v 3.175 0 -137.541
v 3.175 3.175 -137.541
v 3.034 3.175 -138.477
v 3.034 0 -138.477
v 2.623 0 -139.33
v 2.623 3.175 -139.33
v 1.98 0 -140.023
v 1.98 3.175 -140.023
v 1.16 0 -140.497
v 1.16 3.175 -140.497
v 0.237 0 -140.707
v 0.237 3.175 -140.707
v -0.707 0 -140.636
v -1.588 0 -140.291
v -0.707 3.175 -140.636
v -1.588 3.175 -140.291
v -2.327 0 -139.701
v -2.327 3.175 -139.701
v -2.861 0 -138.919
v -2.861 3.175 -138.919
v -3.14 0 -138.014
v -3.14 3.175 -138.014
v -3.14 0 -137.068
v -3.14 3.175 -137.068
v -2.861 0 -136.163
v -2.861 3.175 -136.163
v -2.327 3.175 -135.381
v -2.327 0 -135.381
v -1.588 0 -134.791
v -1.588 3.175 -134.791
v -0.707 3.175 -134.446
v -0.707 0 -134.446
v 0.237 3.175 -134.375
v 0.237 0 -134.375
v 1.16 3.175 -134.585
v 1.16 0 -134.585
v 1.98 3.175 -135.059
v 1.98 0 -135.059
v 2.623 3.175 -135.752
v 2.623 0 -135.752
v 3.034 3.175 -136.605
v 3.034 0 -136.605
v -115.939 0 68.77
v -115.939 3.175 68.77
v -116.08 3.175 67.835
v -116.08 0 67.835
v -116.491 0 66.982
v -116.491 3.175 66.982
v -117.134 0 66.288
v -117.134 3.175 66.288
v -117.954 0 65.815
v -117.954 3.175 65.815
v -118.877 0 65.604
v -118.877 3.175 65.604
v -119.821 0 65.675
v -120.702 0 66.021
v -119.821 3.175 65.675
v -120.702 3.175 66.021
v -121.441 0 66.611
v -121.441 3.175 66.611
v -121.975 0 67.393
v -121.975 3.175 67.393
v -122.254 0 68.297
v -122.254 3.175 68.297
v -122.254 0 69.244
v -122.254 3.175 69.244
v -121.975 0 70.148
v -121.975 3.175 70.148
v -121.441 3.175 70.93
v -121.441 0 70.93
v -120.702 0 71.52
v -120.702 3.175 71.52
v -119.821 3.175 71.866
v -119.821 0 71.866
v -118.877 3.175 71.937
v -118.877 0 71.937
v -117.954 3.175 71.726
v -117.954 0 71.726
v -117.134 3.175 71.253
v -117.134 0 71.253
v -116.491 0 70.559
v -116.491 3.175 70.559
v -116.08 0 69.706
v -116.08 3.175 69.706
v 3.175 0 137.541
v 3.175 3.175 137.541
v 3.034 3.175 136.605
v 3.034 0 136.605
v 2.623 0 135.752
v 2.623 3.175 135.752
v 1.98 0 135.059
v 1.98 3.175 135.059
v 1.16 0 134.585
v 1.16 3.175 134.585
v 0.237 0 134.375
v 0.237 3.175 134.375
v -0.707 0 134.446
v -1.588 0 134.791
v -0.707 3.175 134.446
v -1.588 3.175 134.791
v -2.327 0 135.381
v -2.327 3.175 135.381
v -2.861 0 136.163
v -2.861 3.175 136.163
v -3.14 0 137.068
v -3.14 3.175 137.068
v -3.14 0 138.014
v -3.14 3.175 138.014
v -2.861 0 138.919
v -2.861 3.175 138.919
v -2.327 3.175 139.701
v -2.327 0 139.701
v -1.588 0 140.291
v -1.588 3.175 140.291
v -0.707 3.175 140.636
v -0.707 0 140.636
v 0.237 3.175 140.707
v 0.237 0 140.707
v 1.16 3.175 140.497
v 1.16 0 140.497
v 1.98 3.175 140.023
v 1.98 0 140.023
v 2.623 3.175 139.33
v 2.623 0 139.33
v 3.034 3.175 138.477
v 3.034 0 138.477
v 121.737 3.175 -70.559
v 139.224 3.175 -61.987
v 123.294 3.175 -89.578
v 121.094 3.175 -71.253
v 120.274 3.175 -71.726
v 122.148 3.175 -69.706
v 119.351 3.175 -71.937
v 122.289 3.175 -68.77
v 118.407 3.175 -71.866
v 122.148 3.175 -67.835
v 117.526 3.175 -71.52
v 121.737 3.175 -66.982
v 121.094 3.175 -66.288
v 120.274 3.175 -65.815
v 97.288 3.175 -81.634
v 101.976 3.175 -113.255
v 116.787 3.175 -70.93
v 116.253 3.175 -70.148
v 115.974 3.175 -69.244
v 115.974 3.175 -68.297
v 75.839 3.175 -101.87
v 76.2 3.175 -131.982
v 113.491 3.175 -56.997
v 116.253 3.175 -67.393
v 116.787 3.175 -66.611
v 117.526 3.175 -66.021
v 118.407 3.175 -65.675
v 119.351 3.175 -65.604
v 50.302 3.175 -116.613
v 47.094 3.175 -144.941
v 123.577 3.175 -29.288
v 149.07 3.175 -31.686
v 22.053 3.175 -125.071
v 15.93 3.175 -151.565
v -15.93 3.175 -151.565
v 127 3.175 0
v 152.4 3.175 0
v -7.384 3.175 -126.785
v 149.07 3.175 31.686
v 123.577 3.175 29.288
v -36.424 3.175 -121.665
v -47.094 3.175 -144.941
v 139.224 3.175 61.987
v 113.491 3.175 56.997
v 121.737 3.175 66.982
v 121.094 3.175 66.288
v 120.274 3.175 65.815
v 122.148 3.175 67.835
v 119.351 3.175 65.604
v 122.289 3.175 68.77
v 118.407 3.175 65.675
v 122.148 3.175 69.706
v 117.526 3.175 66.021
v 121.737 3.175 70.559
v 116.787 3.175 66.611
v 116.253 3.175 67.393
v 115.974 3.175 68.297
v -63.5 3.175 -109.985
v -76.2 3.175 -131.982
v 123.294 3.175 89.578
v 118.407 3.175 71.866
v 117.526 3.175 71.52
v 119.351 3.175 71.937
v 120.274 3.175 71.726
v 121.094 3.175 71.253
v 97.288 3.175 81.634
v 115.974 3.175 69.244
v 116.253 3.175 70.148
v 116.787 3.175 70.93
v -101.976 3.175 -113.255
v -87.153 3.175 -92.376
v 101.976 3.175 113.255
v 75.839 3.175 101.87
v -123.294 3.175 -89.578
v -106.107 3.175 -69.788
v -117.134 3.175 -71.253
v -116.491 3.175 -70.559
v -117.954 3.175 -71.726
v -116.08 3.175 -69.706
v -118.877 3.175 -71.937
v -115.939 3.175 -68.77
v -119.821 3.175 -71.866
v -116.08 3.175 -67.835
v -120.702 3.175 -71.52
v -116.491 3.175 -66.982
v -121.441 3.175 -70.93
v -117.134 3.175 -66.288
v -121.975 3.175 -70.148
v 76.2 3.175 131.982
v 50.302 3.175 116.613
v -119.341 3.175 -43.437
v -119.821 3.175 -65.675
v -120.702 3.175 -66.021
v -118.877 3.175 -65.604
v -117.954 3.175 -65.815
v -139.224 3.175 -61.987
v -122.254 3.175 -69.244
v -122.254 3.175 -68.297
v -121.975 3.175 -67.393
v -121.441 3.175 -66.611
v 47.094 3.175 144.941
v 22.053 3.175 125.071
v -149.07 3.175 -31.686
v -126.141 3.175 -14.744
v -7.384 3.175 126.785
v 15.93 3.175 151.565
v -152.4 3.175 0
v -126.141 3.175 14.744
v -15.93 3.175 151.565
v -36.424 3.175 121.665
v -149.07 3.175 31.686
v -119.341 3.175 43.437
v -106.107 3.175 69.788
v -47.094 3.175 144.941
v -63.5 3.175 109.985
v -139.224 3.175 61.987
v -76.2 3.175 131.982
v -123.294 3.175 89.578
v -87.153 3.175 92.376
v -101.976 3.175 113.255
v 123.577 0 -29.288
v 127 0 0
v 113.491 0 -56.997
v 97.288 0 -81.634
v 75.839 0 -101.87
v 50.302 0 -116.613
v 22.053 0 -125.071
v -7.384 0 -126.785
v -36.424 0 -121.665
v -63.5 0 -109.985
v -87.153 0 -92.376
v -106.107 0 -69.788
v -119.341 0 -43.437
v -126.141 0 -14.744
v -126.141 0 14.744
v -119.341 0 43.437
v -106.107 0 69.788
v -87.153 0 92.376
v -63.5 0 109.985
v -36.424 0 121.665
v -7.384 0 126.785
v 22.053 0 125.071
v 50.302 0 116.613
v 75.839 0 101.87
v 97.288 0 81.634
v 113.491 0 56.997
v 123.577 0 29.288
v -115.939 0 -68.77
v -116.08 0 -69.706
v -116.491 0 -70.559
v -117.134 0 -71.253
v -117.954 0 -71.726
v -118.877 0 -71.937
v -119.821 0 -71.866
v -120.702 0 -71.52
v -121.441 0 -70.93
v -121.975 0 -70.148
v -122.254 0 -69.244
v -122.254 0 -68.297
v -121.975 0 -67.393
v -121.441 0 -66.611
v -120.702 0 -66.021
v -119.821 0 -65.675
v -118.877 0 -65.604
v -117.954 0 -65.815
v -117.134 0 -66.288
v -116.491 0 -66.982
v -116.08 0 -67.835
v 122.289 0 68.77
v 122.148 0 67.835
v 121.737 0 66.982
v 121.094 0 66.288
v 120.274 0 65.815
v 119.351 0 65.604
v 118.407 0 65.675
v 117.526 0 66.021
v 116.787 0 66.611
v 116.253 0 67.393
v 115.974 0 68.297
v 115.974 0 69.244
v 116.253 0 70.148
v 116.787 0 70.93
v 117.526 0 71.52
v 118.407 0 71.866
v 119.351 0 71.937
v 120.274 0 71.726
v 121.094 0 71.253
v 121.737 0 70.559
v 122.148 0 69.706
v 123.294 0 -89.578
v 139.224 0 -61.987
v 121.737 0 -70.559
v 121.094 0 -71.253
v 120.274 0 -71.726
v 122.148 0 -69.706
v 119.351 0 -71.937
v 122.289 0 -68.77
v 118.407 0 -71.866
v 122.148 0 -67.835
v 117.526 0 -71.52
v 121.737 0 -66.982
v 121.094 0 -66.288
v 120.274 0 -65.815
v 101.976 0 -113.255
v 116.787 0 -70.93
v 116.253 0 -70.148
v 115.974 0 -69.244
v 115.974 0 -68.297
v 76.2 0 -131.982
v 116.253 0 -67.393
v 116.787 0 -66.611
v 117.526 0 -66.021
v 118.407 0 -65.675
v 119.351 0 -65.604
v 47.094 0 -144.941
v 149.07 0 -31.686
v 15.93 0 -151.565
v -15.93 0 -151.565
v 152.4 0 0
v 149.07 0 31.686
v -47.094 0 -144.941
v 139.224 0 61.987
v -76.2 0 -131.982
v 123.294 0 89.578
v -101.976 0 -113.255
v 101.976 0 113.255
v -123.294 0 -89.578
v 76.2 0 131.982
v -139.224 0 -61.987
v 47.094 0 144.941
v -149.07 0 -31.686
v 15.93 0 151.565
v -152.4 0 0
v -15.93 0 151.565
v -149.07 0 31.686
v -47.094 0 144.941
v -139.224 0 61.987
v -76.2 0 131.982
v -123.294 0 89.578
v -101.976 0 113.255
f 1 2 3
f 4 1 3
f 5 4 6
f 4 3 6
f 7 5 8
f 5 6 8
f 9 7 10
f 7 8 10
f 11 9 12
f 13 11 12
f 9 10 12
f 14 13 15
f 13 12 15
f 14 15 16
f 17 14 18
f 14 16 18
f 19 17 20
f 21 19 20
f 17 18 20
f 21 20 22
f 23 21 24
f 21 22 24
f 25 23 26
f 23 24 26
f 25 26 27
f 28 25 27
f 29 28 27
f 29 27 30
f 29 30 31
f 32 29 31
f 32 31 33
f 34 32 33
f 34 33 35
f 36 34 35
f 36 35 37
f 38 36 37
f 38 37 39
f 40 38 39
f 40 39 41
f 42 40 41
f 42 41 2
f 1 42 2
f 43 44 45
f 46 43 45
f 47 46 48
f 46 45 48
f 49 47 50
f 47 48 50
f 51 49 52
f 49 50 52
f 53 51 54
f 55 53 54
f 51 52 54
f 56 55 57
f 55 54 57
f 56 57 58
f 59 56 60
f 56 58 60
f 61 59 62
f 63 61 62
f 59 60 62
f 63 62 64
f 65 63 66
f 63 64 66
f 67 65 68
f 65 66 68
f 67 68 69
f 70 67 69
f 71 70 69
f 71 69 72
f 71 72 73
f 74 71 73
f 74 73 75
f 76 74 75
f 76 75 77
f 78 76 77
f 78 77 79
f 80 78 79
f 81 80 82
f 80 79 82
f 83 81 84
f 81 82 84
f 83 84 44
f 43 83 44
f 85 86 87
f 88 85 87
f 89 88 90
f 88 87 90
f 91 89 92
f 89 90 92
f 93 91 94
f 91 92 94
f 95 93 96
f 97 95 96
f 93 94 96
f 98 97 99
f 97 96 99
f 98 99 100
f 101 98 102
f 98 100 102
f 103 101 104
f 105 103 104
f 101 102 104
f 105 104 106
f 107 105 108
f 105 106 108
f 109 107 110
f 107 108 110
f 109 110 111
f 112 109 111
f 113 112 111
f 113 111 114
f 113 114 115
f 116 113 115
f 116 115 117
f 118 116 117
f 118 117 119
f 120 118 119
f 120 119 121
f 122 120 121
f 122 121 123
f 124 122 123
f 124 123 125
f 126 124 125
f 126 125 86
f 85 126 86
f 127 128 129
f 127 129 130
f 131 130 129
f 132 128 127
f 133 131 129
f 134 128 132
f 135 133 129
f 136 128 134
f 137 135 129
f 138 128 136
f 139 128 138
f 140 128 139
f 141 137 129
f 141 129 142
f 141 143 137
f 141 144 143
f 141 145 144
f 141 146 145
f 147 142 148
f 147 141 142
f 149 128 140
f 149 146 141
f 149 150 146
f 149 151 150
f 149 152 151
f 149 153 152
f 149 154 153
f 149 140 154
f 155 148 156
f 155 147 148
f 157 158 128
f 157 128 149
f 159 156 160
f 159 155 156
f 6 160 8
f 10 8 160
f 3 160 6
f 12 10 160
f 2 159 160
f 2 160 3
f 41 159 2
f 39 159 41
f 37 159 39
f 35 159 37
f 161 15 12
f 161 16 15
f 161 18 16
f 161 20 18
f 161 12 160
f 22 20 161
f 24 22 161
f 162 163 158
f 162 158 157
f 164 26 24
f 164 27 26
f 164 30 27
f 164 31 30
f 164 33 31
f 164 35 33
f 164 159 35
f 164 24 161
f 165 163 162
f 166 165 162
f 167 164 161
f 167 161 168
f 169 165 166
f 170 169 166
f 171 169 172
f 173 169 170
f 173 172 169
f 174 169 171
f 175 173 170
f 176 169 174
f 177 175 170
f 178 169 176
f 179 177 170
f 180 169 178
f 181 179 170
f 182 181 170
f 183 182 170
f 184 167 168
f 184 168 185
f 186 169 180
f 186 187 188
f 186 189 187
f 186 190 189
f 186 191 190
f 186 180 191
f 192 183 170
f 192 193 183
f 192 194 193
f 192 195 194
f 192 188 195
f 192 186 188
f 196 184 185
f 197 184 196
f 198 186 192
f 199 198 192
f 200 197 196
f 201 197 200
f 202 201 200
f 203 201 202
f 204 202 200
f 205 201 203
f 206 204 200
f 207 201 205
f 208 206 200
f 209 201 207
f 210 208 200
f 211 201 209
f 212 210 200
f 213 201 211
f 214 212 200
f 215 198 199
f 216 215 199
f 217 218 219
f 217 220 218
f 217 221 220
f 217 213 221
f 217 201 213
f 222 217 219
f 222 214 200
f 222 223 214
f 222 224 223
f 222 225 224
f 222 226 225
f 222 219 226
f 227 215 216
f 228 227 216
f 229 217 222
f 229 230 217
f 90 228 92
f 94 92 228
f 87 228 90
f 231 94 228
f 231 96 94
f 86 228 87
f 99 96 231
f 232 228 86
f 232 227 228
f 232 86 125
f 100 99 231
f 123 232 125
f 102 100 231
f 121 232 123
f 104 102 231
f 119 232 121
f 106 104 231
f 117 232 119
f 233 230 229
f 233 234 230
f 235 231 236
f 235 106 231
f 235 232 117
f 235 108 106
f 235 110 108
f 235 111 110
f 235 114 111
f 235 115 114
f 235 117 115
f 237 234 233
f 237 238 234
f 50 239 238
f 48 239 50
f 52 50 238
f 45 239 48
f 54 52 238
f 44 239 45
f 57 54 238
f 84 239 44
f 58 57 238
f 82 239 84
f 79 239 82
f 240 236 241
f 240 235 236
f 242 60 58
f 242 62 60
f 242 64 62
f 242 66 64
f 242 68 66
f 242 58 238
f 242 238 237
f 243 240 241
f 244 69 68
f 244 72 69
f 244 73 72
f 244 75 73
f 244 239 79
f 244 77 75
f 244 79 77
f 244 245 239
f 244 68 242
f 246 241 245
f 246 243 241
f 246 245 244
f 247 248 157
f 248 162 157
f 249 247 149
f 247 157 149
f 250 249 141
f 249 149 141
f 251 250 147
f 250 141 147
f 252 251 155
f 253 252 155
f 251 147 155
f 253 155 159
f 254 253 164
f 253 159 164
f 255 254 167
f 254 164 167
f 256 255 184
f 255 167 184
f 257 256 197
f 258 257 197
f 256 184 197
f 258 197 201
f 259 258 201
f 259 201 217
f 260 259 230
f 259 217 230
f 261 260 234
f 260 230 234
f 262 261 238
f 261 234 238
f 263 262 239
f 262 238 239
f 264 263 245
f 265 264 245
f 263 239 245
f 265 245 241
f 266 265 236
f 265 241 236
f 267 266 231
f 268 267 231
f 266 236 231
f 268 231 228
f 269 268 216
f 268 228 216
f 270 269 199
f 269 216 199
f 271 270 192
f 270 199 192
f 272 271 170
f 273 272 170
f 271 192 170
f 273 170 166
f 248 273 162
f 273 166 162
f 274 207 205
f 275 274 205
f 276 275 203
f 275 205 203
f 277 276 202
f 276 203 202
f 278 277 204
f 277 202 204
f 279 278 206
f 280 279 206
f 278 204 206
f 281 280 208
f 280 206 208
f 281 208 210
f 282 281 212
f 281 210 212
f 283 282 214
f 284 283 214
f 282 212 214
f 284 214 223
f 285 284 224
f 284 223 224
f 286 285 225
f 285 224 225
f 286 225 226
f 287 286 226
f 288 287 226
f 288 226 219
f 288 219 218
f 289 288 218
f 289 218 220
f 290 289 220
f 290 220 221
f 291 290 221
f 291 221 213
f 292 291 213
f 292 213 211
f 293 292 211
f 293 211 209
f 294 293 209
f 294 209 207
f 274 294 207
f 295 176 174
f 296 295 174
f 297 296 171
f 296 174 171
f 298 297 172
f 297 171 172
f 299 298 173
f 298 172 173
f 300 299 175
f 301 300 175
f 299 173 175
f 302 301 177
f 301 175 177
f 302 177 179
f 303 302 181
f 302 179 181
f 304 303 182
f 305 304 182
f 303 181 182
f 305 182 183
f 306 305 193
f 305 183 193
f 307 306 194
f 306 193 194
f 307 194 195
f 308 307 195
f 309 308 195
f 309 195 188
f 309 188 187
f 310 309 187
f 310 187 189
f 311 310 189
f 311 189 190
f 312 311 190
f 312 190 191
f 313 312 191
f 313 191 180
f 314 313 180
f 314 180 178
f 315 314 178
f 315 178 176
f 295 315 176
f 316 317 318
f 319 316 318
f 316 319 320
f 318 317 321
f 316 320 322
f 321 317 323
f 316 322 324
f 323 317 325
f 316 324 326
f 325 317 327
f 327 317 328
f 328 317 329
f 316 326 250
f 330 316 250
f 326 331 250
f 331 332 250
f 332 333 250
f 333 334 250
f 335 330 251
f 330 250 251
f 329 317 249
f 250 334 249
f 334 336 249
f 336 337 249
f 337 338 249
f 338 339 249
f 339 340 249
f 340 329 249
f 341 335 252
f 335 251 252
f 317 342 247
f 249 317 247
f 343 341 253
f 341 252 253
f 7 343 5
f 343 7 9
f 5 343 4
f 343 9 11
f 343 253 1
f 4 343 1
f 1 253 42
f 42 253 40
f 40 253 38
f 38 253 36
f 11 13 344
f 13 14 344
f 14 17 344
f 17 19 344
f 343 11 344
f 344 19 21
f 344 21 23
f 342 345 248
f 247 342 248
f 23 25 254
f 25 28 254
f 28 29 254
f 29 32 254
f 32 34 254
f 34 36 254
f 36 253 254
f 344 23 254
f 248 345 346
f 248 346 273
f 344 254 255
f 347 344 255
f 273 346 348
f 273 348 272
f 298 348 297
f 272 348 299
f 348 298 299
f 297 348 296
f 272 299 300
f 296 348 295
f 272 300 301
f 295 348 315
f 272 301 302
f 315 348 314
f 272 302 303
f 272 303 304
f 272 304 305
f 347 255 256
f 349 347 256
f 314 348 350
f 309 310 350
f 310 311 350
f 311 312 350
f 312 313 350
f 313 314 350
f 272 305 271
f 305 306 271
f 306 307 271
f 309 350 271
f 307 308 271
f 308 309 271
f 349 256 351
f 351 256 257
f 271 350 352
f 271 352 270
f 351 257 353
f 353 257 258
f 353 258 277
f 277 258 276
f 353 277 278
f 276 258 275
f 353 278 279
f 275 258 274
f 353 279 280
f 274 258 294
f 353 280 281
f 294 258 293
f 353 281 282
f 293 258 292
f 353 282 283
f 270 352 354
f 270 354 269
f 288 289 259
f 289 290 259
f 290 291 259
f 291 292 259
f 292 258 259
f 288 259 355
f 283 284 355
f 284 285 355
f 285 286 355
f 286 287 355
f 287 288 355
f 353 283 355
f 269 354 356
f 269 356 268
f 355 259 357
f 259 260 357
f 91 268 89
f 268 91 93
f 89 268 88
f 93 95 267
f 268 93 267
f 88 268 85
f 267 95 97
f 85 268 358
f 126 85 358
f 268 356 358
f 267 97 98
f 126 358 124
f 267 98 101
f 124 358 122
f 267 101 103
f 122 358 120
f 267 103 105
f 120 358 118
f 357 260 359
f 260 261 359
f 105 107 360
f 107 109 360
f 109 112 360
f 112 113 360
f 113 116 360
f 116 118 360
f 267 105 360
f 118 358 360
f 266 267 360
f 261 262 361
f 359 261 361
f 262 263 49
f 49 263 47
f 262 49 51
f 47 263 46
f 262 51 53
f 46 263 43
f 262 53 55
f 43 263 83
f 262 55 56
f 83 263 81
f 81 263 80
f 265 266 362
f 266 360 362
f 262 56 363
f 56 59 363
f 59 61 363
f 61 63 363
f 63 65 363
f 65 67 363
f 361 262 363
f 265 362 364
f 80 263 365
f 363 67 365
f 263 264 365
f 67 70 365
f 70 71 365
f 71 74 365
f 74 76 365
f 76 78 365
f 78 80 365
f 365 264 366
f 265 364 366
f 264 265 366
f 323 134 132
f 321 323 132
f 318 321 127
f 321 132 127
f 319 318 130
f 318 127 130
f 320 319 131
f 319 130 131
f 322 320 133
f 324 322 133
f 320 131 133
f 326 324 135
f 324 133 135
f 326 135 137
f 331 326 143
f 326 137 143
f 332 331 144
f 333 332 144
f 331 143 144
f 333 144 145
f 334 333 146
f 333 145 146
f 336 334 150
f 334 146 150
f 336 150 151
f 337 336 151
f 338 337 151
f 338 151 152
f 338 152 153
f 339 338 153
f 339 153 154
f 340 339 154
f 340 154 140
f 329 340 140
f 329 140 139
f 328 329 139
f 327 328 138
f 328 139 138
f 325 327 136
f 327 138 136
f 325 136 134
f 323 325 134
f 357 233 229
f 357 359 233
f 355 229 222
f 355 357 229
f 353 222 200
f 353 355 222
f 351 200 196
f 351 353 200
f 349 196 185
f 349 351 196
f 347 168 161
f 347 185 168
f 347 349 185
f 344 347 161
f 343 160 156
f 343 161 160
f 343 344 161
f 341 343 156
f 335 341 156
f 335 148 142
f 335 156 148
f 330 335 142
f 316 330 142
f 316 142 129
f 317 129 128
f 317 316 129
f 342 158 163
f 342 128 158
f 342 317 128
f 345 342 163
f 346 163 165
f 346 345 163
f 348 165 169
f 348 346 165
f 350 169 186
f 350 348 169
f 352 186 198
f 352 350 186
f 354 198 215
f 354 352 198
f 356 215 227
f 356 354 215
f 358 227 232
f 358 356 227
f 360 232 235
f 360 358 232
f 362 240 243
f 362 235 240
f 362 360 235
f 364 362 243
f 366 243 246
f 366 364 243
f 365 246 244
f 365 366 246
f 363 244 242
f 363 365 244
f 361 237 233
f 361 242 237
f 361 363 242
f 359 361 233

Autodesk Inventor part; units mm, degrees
ref_plane "YZ Plane" through (0, 0, 0) normal (1, 0, 0) x (0, 1, 0)
ref_plane "XZ Plane" through (0, 0, 0) normal (0, 1, 0) x (-1, 0, 0)
ref_plane "XY Plane" through (0, 0, 0) normal (0, 0, 1) x (1, 0, 0)
sketch "Sketch1" plane through (0, 0, 0) normal (0, 1, 0) x (-1, 0, 0)
  circle A0 centre (0, 0) radius 152.4
  dimension "d0" = 304.8
extrude "Extrusion1" add sketch "Sketch1" along normal blind 3.175
sketch "Sketch2" plane through (0, 3.175, 0) normal (0, 1, 0) x (1, 0, 0)
  circle A0 centre (0, 0) radius 137.541 construction
  circle A1 centre (0, -137.541) radius 3.175
  circle A2 centre (119.114, -68.7705) radius 3.175
  circle A3 centre (119.114, 68.7705) radius 3.175
  circle A4 centre (0, 137.541) radius 3.175
  circle A5 centre (-119.114, 68.7705) radius 3.175
  circle A6 centre (-119.114, -68.7705) radius 3.175
  dimension "d3" = 275.082
  dimension "d4" = 6.35
  dimension "d7" = 360
extrude "Extrusion2" cut sketch "Sketch2" against normal through all
sketch "Sketch3" plane through (0, 3.175, 0) normal (0, 1, 0) x (1, 0, 0)
  circle A0 centre (0, 0) radius 127
  dimension "d11" = 254
extrude "Extrusion3" cut sketch "Sketch3" against normal through all
sketch "Sketch5" plane through (0, 3.175, 0) normal (0, 1, 0) x (1, 0, 0)
  point P0 (0, 0)
  point P1 (0, 0)
properties part number "Top Plate"
